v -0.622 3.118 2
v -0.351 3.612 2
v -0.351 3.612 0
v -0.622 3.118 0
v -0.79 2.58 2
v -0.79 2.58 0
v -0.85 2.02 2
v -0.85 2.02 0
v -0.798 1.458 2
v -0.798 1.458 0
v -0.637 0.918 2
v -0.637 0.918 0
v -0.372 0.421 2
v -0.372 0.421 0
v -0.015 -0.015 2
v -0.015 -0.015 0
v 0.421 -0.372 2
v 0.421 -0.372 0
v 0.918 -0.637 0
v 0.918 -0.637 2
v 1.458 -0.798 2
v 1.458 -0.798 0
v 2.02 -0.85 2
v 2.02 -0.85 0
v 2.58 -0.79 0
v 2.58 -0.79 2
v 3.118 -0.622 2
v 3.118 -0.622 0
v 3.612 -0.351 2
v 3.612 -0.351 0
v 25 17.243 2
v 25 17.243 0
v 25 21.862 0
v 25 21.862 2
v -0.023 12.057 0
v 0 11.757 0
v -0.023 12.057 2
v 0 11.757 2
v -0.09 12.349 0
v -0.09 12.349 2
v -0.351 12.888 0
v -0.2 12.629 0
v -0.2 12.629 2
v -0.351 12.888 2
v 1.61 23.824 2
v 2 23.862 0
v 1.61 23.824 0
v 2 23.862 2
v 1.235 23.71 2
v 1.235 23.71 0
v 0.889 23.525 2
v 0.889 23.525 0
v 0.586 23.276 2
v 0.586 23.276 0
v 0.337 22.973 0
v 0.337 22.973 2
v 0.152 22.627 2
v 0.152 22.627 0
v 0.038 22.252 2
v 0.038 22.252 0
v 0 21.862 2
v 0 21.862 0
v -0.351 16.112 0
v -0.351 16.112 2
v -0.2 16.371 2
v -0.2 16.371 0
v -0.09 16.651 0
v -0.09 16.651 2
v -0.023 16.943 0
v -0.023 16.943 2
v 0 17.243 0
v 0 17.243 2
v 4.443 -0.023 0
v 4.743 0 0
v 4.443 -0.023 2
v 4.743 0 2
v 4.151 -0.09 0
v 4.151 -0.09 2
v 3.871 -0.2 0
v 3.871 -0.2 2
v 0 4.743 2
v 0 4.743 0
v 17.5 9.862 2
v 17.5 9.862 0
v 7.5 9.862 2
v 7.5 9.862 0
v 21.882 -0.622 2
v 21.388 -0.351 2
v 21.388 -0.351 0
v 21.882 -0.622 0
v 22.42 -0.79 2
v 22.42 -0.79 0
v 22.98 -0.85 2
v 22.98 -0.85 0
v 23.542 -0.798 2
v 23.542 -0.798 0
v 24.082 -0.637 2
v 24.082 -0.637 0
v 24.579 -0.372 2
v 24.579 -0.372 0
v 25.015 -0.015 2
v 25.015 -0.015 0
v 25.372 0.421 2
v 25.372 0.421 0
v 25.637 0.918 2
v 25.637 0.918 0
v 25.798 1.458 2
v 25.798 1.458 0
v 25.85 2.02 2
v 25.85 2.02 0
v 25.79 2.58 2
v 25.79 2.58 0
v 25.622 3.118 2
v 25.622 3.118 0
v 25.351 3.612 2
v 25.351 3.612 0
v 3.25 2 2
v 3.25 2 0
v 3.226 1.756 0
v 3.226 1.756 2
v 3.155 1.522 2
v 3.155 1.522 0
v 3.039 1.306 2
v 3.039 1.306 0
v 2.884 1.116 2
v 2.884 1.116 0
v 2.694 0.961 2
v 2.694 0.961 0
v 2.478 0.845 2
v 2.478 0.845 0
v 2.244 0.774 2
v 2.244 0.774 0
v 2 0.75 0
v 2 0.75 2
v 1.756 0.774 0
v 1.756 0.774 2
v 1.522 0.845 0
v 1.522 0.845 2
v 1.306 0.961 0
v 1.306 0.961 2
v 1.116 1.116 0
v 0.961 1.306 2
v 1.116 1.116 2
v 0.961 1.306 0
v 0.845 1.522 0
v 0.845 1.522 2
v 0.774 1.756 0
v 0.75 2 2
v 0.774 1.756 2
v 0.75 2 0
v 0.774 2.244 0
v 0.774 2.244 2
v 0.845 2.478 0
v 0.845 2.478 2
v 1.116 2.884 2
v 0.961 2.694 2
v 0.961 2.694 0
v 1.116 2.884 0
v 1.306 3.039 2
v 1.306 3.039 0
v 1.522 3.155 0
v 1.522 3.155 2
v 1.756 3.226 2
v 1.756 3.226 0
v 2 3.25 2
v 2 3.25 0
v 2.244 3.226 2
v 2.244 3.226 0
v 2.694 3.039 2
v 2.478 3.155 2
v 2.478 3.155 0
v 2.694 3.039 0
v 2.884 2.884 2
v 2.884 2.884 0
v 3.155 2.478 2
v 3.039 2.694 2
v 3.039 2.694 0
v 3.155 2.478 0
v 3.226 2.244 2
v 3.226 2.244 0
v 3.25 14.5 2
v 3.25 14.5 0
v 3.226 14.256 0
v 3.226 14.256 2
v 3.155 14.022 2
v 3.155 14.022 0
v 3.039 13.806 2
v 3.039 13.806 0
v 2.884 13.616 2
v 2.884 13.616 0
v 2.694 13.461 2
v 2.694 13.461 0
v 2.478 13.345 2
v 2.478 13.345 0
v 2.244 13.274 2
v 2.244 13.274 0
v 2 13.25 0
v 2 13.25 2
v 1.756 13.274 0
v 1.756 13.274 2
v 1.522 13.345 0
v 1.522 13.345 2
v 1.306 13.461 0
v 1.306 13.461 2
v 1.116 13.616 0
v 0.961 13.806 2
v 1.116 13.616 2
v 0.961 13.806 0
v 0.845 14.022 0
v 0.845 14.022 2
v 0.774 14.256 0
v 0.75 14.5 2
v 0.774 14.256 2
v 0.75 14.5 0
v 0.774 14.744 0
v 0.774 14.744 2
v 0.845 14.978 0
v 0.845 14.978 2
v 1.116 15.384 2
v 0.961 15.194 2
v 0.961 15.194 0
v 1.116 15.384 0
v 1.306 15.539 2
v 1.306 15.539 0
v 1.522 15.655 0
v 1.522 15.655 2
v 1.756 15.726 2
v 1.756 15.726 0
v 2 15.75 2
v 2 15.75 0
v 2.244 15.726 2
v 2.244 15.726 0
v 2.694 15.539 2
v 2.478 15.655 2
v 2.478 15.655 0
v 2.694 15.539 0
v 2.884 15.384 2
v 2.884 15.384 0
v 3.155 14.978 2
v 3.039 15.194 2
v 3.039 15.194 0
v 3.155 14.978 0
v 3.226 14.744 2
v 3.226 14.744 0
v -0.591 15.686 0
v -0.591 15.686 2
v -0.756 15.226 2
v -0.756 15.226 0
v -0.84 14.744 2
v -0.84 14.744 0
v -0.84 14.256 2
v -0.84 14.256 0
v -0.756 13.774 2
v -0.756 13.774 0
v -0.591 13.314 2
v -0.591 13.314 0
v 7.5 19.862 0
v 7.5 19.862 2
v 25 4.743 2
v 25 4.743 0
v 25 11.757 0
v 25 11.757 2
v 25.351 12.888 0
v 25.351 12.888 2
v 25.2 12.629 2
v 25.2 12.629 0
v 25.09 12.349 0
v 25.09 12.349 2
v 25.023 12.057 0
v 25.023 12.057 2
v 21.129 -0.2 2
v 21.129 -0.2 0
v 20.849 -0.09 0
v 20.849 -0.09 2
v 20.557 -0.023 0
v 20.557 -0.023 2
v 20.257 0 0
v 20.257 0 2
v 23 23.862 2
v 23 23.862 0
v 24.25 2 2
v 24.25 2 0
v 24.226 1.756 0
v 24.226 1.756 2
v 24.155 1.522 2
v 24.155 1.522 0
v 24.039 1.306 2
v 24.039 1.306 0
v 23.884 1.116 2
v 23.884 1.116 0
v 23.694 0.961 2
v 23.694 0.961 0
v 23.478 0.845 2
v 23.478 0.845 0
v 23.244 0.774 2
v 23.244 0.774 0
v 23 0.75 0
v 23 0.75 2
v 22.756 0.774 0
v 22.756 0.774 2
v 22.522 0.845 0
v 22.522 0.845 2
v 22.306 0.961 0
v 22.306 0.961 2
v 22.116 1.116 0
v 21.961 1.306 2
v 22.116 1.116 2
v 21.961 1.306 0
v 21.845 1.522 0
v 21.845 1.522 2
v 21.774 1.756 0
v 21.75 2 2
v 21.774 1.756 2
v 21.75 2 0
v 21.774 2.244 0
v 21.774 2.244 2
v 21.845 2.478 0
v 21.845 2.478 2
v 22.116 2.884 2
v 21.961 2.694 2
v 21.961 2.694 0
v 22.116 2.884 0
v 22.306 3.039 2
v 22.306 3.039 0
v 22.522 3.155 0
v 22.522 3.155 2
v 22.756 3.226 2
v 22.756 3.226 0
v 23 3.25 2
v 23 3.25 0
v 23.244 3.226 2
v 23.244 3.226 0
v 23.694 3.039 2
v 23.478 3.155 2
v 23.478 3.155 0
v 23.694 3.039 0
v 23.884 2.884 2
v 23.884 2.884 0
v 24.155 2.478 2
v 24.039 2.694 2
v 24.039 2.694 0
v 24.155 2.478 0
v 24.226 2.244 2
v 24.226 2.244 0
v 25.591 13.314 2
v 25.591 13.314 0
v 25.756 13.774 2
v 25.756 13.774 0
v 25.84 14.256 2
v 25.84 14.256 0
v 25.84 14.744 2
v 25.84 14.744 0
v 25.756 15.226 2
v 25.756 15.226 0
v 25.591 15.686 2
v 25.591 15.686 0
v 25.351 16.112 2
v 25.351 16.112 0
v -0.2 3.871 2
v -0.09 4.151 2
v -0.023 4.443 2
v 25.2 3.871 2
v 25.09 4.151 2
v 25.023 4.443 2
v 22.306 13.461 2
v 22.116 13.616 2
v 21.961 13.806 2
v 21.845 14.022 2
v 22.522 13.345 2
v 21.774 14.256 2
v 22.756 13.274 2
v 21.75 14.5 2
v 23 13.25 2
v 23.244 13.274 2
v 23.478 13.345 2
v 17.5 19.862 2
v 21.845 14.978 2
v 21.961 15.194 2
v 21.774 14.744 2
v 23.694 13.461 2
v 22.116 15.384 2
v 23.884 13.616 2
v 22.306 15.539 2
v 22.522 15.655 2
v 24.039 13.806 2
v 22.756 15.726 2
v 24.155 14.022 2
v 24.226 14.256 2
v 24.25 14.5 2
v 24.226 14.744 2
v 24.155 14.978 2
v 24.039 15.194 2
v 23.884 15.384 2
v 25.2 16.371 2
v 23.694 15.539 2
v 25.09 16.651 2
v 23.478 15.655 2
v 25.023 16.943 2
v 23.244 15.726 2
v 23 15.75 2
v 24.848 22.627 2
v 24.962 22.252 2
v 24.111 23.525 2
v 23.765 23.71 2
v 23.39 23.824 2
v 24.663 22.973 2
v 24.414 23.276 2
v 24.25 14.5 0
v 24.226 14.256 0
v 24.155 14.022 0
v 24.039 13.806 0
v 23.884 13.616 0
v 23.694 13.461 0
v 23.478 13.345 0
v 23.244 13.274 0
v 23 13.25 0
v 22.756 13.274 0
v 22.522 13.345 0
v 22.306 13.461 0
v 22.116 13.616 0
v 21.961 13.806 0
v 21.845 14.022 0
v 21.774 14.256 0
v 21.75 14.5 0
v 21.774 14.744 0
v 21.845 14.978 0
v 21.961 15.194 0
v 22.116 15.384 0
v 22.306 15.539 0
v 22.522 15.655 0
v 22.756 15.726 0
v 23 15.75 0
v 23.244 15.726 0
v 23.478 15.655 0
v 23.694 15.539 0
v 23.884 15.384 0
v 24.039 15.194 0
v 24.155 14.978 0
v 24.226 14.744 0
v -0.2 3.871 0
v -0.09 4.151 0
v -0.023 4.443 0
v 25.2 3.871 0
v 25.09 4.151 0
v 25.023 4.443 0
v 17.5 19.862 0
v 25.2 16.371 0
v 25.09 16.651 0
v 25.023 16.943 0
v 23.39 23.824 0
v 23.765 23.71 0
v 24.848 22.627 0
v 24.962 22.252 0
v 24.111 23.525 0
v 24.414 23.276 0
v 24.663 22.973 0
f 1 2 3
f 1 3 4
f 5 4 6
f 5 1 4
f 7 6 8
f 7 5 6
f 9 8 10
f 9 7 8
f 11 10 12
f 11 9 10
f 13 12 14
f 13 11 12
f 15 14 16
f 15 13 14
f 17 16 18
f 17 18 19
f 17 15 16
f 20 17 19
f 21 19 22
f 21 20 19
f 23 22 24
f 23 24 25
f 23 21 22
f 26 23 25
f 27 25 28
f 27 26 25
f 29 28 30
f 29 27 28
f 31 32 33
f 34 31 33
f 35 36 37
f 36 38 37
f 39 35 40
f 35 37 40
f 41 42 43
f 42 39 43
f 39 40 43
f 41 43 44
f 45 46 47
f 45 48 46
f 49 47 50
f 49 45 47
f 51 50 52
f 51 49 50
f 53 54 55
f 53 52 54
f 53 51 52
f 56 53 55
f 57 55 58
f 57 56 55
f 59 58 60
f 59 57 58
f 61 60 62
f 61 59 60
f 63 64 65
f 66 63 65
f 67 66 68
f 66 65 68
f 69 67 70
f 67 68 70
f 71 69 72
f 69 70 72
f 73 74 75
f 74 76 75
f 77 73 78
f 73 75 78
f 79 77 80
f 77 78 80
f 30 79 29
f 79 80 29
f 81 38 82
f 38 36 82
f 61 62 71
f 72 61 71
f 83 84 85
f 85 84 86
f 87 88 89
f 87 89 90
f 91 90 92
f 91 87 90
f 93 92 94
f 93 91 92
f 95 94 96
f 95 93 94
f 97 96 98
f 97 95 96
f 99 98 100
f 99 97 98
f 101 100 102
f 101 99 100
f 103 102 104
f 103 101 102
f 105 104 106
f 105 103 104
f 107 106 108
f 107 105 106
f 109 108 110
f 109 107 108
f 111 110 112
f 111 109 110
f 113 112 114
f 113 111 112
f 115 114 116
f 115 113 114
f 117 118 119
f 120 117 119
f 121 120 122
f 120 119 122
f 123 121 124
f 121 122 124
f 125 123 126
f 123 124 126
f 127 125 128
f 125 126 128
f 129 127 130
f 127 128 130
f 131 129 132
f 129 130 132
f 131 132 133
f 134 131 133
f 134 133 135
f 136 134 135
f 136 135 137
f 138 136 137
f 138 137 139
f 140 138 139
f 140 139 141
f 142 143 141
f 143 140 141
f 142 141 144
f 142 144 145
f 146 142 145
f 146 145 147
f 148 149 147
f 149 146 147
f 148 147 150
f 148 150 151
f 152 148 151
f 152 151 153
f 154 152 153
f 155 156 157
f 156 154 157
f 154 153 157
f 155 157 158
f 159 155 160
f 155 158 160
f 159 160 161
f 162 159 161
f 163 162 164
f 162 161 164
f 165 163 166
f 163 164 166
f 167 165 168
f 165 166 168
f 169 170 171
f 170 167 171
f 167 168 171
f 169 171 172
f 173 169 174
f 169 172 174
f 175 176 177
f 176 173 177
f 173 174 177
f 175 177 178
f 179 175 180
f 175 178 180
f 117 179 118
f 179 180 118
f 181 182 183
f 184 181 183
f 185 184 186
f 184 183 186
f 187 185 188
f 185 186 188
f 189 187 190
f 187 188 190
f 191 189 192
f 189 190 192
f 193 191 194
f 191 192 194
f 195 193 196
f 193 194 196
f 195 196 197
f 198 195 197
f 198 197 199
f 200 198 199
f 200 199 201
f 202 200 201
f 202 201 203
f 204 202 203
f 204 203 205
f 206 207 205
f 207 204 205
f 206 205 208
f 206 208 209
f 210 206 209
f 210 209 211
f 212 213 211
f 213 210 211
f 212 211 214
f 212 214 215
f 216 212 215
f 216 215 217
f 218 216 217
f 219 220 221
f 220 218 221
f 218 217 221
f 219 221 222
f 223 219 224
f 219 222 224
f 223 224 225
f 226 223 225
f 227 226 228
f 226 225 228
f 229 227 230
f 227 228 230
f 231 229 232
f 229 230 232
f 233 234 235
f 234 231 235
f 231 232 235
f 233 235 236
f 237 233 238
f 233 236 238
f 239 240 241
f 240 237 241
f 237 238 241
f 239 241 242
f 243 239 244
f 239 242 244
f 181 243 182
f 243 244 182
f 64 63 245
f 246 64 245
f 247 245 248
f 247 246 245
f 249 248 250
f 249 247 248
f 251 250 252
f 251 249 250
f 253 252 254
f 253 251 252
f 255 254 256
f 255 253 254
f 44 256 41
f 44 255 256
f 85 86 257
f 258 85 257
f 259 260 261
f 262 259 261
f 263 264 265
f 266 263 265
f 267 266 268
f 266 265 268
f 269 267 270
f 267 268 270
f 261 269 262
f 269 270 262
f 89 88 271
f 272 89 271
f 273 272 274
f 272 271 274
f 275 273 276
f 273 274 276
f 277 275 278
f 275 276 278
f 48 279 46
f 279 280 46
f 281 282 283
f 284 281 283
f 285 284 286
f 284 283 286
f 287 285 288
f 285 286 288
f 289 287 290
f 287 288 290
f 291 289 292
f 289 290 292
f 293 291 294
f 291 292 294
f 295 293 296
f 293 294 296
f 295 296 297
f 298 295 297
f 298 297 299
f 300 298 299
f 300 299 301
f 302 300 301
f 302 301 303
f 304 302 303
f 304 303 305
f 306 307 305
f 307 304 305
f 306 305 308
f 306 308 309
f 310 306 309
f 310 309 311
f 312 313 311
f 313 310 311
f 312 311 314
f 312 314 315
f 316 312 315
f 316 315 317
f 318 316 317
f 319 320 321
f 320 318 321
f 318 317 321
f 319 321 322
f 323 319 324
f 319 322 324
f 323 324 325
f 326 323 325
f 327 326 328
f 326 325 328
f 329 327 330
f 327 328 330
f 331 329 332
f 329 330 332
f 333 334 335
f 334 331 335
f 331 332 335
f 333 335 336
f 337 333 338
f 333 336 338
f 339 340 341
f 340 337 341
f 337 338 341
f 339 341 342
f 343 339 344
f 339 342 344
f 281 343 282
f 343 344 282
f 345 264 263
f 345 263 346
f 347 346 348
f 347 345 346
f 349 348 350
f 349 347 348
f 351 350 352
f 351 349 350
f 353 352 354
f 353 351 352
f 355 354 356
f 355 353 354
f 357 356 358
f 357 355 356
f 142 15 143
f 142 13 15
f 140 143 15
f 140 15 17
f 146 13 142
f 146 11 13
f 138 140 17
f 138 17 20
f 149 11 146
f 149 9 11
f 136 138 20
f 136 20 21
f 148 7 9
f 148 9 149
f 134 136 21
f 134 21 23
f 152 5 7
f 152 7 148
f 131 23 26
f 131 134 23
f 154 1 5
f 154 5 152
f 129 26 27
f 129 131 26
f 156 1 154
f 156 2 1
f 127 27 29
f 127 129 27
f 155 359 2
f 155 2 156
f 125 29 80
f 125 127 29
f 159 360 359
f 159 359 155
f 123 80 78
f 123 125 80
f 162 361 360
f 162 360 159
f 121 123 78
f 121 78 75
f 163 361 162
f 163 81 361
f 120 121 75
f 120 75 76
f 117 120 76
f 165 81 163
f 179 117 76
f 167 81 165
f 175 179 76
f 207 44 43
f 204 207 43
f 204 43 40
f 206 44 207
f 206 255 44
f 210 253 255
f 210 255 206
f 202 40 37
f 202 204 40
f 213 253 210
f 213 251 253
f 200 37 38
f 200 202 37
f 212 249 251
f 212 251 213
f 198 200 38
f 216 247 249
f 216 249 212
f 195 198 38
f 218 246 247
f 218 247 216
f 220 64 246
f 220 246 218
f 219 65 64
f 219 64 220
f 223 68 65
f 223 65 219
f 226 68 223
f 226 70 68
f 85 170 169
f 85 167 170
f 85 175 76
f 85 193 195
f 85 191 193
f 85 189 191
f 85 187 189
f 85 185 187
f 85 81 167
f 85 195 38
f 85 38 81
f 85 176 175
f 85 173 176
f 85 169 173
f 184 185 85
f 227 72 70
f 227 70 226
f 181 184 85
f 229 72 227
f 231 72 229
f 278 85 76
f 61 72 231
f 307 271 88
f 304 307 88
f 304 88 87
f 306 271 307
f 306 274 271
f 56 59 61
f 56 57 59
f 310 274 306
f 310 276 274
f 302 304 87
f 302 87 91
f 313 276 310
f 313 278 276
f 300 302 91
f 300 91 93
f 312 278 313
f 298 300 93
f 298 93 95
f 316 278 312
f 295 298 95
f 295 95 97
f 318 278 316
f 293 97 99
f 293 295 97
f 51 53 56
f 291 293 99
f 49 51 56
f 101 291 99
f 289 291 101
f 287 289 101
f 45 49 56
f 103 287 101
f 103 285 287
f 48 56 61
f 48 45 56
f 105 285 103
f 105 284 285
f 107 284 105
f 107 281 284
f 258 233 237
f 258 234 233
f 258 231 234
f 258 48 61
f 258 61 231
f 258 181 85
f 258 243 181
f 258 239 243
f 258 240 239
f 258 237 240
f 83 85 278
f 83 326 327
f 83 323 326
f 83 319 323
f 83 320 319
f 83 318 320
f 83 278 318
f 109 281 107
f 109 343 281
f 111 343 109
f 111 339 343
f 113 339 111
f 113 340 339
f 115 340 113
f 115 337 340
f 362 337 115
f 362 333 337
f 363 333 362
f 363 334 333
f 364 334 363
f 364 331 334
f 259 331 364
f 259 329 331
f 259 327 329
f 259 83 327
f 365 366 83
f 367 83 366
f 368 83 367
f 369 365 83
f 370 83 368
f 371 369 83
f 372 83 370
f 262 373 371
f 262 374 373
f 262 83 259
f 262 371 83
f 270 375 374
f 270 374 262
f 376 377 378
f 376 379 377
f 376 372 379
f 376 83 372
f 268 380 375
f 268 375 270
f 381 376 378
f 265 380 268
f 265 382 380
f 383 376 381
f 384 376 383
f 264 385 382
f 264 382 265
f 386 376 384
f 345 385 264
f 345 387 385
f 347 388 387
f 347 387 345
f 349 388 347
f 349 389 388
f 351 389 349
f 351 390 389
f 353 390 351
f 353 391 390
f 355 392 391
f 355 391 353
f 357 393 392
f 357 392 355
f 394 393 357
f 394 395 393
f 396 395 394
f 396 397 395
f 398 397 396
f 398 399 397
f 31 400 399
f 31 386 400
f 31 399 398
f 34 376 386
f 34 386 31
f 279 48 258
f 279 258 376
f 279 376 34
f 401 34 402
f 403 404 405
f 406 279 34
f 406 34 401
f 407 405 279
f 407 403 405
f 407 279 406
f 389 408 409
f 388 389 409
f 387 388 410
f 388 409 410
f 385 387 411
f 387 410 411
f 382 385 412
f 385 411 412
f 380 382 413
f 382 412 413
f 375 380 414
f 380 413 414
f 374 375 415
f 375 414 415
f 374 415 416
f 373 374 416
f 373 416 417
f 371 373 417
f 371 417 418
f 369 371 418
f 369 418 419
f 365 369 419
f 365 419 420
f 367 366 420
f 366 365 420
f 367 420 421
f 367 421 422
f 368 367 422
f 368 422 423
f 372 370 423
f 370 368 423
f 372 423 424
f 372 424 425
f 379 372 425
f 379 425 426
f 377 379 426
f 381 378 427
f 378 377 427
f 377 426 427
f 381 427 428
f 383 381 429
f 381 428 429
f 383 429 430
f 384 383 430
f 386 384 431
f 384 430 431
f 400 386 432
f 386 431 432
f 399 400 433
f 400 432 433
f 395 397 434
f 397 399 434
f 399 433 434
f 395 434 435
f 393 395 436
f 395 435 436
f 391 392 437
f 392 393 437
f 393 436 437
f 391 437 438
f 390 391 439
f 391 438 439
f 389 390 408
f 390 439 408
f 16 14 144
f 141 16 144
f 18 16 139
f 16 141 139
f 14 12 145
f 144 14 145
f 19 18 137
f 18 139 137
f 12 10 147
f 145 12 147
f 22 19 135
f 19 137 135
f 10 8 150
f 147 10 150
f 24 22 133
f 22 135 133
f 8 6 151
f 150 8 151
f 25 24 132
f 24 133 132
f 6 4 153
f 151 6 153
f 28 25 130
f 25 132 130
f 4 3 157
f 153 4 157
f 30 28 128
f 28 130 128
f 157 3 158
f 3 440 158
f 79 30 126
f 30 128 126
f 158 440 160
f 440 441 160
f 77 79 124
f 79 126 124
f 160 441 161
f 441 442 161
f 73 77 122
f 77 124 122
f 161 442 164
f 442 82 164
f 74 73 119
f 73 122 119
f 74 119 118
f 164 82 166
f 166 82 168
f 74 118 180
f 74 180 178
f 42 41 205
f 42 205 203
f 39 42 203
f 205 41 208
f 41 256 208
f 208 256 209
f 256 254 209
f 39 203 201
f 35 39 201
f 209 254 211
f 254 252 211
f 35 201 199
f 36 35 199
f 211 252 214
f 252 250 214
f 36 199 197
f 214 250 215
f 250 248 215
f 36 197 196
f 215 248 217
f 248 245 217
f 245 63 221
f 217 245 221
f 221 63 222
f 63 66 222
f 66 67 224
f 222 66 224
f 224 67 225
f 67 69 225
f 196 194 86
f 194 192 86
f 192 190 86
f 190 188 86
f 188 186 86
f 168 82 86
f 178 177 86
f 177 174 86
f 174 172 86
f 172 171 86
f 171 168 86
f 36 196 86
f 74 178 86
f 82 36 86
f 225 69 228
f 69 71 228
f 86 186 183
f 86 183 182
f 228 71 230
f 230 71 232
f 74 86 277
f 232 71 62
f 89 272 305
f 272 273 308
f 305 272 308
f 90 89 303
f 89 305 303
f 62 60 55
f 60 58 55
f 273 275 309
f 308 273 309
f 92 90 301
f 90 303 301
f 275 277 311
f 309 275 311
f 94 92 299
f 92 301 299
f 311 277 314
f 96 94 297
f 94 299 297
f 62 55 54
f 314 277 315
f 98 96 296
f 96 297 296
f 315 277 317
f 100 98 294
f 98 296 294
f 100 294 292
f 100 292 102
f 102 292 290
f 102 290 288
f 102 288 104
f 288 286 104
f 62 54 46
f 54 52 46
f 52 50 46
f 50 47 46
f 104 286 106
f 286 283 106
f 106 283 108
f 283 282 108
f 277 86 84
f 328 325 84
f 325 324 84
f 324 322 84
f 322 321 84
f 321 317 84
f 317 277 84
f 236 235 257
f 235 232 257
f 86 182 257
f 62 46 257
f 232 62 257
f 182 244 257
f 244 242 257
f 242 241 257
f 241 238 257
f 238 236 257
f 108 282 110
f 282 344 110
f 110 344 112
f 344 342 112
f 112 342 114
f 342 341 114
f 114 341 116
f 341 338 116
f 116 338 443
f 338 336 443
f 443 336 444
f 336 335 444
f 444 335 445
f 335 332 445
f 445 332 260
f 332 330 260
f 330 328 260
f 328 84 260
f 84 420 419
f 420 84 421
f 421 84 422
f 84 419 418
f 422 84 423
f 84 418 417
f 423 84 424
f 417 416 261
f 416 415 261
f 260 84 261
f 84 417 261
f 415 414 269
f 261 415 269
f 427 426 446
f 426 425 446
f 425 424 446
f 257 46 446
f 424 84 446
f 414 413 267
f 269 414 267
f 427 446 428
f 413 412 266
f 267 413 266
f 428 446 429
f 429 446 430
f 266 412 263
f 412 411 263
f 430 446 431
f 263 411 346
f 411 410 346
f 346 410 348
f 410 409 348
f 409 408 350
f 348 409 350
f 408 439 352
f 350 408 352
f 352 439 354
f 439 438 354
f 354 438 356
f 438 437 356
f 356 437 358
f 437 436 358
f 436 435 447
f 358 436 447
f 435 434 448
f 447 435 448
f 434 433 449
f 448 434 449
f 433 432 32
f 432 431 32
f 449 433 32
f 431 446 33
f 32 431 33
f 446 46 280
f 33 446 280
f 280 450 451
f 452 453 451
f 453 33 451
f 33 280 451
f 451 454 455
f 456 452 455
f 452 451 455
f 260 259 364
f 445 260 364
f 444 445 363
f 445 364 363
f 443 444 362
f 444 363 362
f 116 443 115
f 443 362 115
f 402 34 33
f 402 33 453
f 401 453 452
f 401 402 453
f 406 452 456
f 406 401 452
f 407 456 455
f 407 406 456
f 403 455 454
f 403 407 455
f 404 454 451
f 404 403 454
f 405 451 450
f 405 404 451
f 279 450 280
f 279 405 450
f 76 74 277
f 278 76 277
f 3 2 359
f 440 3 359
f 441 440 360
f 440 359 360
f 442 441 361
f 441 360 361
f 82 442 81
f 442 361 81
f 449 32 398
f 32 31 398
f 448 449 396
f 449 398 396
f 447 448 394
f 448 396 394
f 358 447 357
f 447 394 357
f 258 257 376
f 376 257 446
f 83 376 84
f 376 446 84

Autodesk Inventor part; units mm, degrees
ref_plane "YZ Plane" through (0, 0, 0) normal (1, 0, 0) x (0, 1, 0)
ref_plane "XZ Plane" through (0, 0, 0) normal (0, 1, 0) x (-1, 0, 0)
ref_plane "XY Plane" through (0, 0, 0) normal (0, 0, 1) x (1, 0, 0)
sketch "Sketch1" plane through (0, 0, 0) normal (0, 0, 1) x (1, 0, 0)
  line L0 (0, 0) -> (25, 0)
  line L1 (25, 0) -> (25, 23.862)
  line L2 (25, 23.862) -> (0, 23.862)
  line L3 (0, 23.862) -> (0, 0)
  circle A0 centre (2, 2) radius 1.25
  circle A1 centre (23, 2) radius 1.25
  circle A2 centre (2, 14.5) radius 1.25
  circle A3 centre (23, 14.5) radius 1.25
  line L4 (7.5, 19.862) -> (17.5, 19.862)
  line L5 (17.5, 19.862) -> (17.5, 9.862)
  line L6 (17.5, 9.862) -> (7.5, 9.862)
  line L7 (7.5, 9.862) -> (7.5, 19.862)
  line L8 (0, 23.862) -> (7.5, 19.862) construction
  line L9 (17.5, 19.862) -> (25, 23.862) construction
  dimension "d0" = 25
  dimension "d1" = 23.862
  dimension "d2" = 2.5
  dimension "d3" = 2
  dimension "d4" = 2
  dimension "d5" = 14.5
  dimension "d6" = 2
  dimension "d7" = 10
  dimension "d8" = 4
extrude "Extrusion1" add sketch "Sketch1" along normal blind 2
fillet "Fillet1" radius 2 4 edges at (25, 23.862, 1) (0, 23.862, 1) (0, 0, 1) (25, 0, 1)
sketch "Sketch2" plane through (0, 0, 2) normal (0, 0, 1) x (1, 0, 0)
  circle A0 centre (2, 14.5) radius 1.25 projected
  circle A1 centre (2, 2) radius 1.25 projected
  circle A2 centre (23, 2) radius 1.25 projected
  circle A3 centre (23, 14.5) radius 1.25 projected
  circle A4 centre (2, 14.5) radius 2.85
  circle A5 centre (2, 2) radius 2.85
  circle A6 centre (23, 2) radius 2.85
  circle A7 centre (23, 14.5) radius 2.85
  point P0 (0, 0)
  dimension "d12" = 1.6
extrude "Extrusion2" add sketch "Sketch2" against normal up to surface (2 mm away)
fillet "Fillet2" radius 2 8 edges at (0, 16.5304, 1) (0, 12.4696, 1) (0, 4.0304, 1) (4.0304, 0, 1) (20.9696, 0, 1) (25, 4.0304, 1) (25, 16.5304, 1) (25, 12.4696, 1)
properties part number "CameraFilterPlate"
